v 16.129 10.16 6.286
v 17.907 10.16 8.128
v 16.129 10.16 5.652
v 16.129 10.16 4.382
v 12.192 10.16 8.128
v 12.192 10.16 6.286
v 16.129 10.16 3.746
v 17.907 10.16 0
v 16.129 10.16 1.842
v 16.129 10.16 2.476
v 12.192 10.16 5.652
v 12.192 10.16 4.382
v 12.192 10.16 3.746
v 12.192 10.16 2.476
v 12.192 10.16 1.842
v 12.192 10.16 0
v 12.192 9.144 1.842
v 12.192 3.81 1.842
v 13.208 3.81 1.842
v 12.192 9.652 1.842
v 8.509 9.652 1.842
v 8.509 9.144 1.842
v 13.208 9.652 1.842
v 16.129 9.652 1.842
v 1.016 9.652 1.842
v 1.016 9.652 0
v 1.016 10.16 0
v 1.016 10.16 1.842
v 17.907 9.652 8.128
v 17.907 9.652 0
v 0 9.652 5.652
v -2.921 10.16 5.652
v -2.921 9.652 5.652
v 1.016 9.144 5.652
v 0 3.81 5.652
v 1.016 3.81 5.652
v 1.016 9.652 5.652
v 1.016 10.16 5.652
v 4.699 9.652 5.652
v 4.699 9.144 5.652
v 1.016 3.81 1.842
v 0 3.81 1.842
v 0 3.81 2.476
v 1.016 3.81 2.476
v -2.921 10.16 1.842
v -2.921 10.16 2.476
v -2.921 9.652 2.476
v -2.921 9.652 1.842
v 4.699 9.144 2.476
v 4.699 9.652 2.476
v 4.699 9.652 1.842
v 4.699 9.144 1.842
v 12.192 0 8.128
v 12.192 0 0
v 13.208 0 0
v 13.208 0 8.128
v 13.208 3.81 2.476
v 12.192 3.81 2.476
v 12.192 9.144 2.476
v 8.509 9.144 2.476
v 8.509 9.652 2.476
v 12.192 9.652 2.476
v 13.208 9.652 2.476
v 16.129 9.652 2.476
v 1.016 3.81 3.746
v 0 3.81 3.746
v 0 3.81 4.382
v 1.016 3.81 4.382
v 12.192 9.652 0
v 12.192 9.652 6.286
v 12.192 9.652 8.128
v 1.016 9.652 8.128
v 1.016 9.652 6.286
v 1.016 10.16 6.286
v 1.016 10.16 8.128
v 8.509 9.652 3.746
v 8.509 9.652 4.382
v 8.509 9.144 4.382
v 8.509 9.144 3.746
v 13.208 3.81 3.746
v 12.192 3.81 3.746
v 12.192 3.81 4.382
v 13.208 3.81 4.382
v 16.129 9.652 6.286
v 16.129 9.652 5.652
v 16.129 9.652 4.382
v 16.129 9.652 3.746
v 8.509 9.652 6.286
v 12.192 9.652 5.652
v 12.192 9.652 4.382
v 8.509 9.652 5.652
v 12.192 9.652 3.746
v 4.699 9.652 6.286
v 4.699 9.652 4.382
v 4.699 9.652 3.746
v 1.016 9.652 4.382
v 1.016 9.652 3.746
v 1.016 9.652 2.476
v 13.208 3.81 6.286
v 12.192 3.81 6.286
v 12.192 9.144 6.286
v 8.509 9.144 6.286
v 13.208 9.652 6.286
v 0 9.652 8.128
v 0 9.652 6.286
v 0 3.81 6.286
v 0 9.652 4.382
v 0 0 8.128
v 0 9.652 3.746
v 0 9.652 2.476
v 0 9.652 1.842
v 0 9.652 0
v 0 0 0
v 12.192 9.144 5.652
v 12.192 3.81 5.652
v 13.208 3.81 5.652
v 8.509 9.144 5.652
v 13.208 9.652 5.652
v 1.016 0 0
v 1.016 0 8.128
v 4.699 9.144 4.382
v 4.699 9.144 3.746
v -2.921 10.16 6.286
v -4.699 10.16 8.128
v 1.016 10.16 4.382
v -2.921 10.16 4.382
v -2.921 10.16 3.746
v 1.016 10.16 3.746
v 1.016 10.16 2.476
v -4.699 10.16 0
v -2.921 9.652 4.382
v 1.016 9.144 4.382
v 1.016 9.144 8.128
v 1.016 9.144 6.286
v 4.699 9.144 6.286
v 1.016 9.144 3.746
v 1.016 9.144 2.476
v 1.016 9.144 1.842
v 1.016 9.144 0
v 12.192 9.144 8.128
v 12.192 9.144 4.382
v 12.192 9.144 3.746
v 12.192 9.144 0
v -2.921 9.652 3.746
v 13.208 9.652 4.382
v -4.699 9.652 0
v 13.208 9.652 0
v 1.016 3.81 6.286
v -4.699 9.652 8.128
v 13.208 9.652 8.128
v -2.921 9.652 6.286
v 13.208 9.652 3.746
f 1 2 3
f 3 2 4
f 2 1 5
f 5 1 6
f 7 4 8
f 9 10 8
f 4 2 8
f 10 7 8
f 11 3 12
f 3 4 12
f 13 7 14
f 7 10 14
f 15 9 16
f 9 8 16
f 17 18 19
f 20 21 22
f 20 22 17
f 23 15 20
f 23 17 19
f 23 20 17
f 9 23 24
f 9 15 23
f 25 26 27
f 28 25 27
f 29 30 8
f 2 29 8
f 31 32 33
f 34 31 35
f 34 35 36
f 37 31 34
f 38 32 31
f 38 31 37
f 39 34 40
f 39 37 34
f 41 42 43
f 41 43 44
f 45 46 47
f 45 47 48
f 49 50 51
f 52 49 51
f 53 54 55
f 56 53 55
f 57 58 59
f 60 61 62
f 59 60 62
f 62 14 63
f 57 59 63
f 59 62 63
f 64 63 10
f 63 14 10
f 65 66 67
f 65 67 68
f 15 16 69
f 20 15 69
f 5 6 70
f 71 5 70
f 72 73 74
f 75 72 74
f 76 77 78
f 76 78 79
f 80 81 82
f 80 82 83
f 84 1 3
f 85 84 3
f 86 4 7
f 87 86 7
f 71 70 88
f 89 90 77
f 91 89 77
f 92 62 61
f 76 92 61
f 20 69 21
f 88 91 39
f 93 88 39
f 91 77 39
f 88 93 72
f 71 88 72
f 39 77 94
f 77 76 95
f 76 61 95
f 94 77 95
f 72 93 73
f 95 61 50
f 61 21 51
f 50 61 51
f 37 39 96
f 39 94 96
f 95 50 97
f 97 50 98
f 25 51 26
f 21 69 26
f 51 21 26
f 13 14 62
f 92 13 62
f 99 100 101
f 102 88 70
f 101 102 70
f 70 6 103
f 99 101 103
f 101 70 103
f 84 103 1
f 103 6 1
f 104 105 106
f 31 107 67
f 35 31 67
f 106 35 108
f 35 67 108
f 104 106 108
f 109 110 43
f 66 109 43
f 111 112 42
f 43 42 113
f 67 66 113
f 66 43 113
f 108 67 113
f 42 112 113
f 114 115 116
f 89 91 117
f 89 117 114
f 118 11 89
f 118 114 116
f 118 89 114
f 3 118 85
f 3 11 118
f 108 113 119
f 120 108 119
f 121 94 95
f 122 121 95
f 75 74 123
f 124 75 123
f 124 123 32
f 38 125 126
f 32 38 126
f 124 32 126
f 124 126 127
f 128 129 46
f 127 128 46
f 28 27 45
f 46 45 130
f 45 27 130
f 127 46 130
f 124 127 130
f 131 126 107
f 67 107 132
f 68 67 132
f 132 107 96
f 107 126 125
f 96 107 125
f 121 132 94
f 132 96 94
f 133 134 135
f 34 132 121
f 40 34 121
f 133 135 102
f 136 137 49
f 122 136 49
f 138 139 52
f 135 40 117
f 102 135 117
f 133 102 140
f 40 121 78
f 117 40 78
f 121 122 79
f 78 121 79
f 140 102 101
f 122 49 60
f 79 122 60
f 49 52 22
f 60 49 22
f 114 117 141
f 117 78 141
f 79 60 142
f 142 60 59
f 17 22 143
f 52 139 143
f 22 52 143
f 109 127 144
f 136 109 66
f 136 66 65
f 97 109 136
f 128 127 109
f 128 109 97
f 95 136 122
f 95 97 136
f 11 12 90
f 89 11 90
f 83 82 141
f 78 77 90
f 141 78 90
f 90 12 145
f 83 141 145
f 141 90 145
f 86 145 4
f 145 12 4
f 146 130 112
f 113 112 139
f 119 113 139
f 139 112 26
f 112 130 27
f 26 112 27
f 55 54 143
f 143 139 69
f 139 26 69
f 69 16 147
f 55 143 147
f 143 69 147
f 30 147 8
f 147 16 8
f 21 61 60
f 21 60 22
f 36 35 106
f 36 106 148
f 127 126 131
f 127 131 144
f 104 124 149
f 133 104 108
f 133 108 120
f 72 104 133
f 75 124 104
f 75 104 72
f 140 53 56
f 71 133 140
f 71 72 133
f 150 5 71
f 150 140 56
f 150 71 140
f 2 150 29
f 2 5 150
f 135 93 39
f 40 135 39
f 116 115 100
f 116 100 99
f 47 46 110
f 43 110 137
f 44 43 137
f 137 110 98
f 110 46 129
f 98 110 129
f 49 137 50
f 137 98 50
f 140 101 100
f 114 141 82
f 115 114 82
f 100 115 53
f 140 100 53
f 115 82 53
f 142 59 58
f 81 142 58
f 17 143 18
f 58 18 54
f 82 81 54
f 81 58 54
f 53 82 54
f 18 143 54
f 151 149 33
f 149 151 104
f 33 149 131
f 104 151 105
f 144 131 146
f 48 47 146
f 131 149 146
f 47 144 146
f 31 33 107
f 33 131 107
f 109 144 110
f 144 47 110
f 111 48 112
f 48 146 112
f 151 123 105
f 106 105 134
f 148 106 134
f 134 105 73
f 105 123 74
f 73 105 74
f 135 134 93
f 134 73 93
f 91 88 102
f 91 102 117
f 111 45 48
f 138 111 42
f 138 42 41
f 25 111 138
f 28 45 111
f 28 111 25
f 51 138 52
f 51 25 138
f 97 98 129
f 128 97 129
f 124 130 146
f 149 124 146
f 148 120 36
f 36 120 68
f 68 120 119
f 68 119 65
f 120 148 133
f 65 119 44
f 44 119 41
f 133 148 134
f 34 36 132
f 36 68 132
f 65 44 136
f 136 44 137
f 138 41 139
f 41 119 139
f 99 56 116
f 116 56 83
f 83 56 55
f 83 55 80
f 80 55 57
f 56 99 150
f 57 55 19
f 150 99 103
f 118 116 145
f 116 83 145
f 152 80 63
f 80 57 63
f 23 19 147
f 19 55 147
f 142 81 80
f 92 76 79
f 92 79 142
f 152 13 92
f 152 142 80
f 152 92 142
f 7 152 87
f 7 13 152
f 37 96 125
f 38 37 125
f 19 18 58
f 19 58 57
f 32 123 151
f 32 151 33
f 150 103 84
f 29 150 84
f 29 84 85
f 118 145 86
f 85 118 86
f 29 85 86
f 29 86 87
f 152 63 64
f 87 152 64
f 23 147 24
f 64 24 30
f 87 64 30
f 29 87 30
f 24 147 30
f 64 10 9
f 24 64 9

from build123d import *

# Parameters (mm, degrees)
BOSS_EXTRUDE1_DEPTH = 8.128
SKETCH2_W           = 7.62
SKETCH2_H           = 0.635
CUT_EXTRUDE1_DEPTH  = 6.35


with BuildPart() as part:
    # Sketch1 → Boss-Extrude1 (new body)
    with BuildSketch(Plane.XY):
        Polygon((-4.699, 10.16), (-4.699, 9.652), (0, 9.652), (0, 0), (1.016, 0), (1.016, 9.144), (12.192, 9.144), (12.192, 0), (13.208, 0), (13.208, 9.652), (17.907, 9.652), (17.907, 10.16), (12.192, 10.16), (12.192, 9.652), (1.016, 9.652), (1.016, 10.16), align=None)
    extrude(amount=BOSS_EXTRUDE1_DEPTH)

    # Sketch2 → Cut-Extrude1 (cut)
    with BuildSketch(Plane(origin=(0, 10.16, 0), x_dir=(1, 0, 0), z_dir=(0, 1, 0))):
        with Locations((0.889, -2.159)):
            Rectangle(SKETCH2_W, SKETCH2_H)
        with Locations((0.889, -4.064)):
            Rectangle(SKETCH2_W, SKETCH2_H)
        with Locations((0.889, -5.969)):
            Rectangle(SKETCH2_W, SKETCH2_H)
        with Locations((12.319, -2.159)):
            Rectangle(SKETCH2_W, SKETCH2_H)
        with Locations((12.319, -4.064)):
            Rectangle(SKETCH2_W, SKETCH2_H)
        with Locations((12.319, -5.969)):
            Rectangle(SKETCH2_W, SKETCH2_H)
    extrude(amount=-CUT_EXTRUDE1_DEPTH, mode=Mode.SUBTRACT)


solid = part.part
